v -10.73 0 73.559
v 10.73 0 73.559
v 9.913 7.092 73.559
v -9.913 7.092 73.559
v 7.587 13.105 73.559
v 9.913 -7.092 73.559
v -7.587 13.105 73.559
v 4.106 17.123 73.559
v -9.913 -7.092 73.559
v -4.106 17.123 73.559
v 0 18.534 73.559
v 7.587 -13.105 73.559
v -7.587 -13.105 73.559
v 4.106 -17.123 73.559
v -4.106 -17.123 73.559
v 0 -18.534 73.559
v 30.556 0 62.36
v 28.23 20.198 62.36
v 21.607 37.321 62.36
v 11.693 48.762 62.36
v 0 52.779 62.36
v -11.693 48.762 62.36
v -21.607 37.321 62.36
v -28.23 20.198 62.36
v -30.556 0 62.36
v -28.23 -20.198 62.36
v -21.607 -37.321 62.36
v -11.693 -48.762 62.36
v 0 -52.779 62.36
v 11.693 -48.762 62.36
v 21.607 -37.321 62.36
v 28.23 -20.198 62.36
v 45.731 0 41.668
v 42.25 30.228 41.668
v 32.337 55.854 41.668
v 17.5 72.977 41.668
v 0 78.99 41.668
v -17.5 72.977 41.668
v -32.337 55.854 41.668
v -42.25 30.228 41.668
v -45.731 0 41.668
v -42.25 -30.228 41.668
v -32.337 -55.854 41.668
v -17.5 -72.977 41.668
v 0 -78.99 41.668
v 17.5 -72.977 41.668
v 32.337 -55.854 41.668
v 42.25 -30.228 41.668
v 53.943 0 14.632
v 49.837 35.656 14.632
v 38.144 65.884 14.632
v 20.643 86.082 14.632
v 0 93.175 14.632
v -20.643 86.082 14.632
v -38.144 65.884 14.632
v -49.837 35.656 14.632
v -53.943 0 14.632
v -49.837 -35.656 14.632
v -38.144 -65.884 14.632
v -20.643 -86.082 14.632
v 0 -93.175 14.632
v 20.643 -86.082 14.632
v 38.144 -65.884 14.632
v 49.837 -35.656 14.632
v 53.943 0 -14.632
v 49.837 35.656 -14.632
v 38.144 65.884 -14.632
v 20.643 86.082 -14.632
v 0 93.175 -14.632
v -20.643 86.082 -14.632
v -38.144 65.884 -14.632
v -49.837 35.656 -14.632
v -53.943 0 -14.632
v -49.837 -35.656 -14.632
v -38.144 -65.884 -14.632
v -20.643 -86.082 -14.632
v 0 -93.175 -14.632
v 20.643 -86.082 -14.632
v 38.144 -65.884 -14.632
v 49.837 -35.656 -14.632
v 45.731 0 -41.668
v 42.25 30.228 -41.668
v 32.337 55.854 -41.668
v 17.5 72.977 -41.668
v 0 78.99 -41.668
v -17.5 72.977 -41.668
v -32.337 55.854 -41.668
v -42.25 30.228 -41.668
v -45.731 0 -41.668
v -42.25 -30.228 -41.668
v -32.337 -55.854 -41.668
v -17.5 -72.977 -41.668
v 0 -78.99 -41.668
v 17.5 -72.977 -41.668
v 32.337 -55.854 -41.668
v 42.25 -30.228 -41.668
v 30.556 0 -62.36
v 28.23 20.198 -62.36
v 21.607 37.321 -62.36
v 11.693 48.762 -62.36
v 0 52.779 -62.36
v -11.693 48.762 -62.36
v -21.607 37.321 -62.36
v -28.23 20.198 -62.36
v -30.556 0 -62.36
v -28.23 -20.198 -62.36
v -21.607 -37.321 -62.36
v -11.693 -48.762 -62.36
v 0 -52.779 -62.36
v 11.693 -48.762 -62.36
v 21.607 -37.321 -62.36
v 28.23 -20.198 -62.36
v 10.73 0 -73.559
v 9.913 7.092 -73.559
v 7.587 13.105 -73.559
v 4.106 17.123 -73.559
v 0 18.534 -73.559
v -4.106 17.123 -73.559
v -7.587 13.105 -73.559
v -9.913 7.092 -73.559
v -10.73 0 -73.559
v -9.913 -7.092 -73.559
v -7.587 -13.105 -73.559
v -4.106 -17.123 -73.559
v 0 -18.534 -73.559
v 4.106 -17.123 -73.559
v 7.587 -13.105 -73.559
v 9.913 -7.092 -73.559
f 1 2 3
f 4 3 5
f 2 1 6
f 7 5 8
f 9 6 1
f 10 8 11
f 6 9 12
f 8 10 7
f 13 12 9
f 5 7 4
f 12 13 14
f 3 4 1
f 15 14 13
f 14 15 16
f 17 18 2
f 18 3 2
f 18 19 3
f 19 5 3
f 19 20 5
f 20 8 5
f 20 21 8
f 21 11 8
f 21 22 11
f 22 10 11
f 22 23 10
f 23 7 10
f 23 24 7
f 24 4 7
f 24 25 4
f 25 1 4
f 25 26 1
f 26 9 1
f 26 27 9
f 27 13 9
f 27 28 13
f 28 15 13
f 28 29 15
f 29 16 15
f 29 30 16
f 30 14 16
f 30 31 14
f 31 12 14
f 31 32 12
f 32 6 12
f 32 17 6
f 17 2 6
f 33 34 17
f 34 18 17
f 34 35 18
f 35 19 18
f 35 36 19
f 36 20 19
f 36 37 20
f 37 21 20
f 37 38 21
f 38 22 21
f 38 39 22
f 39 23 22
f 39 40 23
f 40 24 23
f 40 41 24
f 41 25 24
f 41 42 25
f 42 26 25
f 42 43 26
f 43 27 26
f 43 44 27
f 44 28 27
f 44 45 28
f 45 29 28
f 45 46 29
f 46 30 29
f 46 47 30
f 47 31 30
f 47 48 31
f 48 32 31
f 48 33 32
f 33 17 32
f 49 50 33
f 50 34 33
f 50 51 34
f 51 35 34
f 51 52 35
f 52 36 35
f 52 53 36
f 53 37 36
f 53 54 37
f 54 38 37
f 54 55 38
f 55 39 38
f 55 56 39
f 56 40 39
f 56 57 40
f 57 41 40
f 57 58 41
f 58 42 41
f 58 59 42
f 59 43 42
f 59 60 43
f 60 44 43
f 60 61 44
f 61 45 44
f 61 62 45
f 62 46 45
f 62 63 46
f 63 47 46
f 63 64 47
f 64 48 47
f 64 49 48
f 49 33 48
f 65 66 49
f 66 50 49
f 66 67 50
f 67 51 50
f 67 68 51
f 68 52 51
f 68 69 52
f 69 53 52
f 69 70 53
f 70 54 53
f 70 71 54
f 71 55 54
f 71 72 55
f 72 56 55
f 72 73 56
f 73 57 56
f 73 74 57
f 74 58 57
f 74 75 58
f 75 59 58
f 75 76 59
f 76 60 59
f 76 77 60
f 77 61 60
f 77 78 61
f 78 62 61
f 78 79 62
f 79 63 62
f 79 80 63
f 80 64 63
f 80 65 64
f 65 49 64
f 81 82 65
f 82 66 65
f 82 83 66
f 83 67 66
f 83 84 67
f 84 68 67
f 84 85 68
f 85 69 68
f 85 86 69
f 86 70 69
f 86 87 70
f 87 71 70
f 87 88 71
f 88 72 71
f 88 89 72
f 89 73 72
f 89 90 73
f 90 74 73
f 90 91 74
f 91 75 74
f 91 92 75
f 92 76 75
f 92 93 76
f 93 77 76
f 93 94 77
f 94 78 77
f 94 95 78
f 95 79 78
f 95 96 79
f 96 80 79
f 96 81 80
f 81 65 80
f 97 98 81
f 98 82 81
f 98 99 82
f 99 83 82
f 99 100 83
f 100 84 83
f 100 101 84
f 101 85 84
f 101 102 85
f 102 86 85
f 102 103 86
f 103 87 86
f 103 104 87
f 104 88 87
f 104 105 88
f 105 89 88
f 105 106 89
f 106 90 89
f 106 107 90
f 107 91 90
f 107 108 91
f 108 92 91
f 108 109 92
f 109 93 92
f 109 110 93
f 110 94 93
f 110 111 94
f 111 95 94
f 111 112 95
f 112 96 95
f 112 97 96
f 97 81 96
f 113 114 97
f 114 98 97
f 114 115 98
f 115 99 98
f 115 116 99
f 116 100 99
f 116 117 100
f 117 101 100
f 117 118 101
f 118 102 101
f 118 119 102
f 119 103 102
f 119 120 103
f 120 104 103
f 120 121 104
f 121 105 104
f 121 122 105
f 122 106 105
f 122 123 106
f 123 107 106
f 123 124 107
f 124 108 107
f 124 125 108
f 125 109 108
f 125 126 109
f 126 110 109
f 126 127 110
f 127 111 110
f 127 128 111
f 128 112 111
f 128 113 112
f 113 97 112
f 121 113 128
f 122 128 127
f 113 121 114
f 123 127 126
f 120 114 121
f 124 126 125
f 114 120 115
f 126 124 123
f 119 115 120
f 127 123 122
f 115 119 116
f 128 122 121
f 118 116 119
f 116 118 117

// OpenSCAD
// Generated by SolidPython 1.0.1 on 2020-07-29 00:46:50


scale(v = [11, 19, 15]) {
	sphere(r = 5);
}
/***********************************************
*********      SolidPython code:      **********
************************************************
 
# import packages: SolidPython
from solid import *
from solid.utils import *
from itertools import chain, combinations, permutations


class Resize:

    def __init__(self, scad_file):
        self.scad_file = scad_file
        #self.scad_file = import_scad(scad_file)
        # cone/cylinder param:
        self.r1 = 0
        self.r2 = 0
        self.h = 0
        # rectangular prism param:
        self.w = 0
        self.l = 0
        # ellipse param:
        self.r = 0

    # import OpenScad code (file name corresponds to shape)


    # classify shape + parameters
    def assign(self, param1, param2, param3):
        if self.scad_file == 'cone.scad':
            self.r1 = param1
            self.r2 = param2
            self.h = param3
        elif self.scad_file == 'cylinder.scad':
            self.r1 = param1
            self.r2 = param2
            self.h = param3
        elif self.scad_file == 'rectangularPrism.scad':
            self.h = param1
            self.l = param2
            self.w = param3
        else:
            self.r = param1
            self.h = param2

    # resize parameters
    def iterate(self):
        x = range(3, 20, 2)
        i = 1
        if self.scad_file == 'cone.scad':
            tempList = list(permutations(x, 2))
            for temp in tempList:
                param1 = temp[0]
                param2 = temp[1]
                filepath = 'produced_scad_files/' + 'cone' + str(param1) + '_' + str(param2) + '_' + '.scad'
                scad_render_to_file(cylinder(h=param1, r1=param2, r2=0), filepath)

        elif self.scad_file == 'cylinder.scad':
            tempList = list(permutations(x, 3))
            for temp in tempList:
                param1 = temp[0]
                param2 = temp[1]
                filepath = 'produced_scad_files/' + 'cylinder' + str(param1) + '_' + str(param2) + '_' + '.scad'
                scad_render_to_file(cylinder(h=param1, r1=param2, r2=param2), filepath)

        elif self.scad_file == 'rectangularPrism.scad':
            tempList = list(permutations(x, 3))
            for temp in tempList:
                param1 = temp[0]
                param2 = temp[1]
                param3 = temp[2]
                filepath = 'produced_scad_files/' + 'rectangularPrism' + str(param1) + '_' + str(param2) + '_' + str(
                    param3) + '.scad'
                scad_render_to_file(cube(size=(param1, param2, param3)), filepath)

        elif self.scad_file == 'ellipse.scad':
            tempList = list(permutations(x, 4))
            for temp in tempList:
                param1 = temp[0]
                param2 = temp[1]
                param3 = temp[2]
                param4 = temp[3]
                filepath = 'produced_scad_files/' + 'ellipse' + str(param1) + '_' + str(param2) + '_' + str(param3) + '_' + str(param4) + '.scad'
                scad_render_to_file(scale([param1, param2, param3])(sphere(r=param4)), filepath)

    def render_to_scadfile(self):
        scad_render_to_file(scad, 'example.scad') 
 
************************************************/
